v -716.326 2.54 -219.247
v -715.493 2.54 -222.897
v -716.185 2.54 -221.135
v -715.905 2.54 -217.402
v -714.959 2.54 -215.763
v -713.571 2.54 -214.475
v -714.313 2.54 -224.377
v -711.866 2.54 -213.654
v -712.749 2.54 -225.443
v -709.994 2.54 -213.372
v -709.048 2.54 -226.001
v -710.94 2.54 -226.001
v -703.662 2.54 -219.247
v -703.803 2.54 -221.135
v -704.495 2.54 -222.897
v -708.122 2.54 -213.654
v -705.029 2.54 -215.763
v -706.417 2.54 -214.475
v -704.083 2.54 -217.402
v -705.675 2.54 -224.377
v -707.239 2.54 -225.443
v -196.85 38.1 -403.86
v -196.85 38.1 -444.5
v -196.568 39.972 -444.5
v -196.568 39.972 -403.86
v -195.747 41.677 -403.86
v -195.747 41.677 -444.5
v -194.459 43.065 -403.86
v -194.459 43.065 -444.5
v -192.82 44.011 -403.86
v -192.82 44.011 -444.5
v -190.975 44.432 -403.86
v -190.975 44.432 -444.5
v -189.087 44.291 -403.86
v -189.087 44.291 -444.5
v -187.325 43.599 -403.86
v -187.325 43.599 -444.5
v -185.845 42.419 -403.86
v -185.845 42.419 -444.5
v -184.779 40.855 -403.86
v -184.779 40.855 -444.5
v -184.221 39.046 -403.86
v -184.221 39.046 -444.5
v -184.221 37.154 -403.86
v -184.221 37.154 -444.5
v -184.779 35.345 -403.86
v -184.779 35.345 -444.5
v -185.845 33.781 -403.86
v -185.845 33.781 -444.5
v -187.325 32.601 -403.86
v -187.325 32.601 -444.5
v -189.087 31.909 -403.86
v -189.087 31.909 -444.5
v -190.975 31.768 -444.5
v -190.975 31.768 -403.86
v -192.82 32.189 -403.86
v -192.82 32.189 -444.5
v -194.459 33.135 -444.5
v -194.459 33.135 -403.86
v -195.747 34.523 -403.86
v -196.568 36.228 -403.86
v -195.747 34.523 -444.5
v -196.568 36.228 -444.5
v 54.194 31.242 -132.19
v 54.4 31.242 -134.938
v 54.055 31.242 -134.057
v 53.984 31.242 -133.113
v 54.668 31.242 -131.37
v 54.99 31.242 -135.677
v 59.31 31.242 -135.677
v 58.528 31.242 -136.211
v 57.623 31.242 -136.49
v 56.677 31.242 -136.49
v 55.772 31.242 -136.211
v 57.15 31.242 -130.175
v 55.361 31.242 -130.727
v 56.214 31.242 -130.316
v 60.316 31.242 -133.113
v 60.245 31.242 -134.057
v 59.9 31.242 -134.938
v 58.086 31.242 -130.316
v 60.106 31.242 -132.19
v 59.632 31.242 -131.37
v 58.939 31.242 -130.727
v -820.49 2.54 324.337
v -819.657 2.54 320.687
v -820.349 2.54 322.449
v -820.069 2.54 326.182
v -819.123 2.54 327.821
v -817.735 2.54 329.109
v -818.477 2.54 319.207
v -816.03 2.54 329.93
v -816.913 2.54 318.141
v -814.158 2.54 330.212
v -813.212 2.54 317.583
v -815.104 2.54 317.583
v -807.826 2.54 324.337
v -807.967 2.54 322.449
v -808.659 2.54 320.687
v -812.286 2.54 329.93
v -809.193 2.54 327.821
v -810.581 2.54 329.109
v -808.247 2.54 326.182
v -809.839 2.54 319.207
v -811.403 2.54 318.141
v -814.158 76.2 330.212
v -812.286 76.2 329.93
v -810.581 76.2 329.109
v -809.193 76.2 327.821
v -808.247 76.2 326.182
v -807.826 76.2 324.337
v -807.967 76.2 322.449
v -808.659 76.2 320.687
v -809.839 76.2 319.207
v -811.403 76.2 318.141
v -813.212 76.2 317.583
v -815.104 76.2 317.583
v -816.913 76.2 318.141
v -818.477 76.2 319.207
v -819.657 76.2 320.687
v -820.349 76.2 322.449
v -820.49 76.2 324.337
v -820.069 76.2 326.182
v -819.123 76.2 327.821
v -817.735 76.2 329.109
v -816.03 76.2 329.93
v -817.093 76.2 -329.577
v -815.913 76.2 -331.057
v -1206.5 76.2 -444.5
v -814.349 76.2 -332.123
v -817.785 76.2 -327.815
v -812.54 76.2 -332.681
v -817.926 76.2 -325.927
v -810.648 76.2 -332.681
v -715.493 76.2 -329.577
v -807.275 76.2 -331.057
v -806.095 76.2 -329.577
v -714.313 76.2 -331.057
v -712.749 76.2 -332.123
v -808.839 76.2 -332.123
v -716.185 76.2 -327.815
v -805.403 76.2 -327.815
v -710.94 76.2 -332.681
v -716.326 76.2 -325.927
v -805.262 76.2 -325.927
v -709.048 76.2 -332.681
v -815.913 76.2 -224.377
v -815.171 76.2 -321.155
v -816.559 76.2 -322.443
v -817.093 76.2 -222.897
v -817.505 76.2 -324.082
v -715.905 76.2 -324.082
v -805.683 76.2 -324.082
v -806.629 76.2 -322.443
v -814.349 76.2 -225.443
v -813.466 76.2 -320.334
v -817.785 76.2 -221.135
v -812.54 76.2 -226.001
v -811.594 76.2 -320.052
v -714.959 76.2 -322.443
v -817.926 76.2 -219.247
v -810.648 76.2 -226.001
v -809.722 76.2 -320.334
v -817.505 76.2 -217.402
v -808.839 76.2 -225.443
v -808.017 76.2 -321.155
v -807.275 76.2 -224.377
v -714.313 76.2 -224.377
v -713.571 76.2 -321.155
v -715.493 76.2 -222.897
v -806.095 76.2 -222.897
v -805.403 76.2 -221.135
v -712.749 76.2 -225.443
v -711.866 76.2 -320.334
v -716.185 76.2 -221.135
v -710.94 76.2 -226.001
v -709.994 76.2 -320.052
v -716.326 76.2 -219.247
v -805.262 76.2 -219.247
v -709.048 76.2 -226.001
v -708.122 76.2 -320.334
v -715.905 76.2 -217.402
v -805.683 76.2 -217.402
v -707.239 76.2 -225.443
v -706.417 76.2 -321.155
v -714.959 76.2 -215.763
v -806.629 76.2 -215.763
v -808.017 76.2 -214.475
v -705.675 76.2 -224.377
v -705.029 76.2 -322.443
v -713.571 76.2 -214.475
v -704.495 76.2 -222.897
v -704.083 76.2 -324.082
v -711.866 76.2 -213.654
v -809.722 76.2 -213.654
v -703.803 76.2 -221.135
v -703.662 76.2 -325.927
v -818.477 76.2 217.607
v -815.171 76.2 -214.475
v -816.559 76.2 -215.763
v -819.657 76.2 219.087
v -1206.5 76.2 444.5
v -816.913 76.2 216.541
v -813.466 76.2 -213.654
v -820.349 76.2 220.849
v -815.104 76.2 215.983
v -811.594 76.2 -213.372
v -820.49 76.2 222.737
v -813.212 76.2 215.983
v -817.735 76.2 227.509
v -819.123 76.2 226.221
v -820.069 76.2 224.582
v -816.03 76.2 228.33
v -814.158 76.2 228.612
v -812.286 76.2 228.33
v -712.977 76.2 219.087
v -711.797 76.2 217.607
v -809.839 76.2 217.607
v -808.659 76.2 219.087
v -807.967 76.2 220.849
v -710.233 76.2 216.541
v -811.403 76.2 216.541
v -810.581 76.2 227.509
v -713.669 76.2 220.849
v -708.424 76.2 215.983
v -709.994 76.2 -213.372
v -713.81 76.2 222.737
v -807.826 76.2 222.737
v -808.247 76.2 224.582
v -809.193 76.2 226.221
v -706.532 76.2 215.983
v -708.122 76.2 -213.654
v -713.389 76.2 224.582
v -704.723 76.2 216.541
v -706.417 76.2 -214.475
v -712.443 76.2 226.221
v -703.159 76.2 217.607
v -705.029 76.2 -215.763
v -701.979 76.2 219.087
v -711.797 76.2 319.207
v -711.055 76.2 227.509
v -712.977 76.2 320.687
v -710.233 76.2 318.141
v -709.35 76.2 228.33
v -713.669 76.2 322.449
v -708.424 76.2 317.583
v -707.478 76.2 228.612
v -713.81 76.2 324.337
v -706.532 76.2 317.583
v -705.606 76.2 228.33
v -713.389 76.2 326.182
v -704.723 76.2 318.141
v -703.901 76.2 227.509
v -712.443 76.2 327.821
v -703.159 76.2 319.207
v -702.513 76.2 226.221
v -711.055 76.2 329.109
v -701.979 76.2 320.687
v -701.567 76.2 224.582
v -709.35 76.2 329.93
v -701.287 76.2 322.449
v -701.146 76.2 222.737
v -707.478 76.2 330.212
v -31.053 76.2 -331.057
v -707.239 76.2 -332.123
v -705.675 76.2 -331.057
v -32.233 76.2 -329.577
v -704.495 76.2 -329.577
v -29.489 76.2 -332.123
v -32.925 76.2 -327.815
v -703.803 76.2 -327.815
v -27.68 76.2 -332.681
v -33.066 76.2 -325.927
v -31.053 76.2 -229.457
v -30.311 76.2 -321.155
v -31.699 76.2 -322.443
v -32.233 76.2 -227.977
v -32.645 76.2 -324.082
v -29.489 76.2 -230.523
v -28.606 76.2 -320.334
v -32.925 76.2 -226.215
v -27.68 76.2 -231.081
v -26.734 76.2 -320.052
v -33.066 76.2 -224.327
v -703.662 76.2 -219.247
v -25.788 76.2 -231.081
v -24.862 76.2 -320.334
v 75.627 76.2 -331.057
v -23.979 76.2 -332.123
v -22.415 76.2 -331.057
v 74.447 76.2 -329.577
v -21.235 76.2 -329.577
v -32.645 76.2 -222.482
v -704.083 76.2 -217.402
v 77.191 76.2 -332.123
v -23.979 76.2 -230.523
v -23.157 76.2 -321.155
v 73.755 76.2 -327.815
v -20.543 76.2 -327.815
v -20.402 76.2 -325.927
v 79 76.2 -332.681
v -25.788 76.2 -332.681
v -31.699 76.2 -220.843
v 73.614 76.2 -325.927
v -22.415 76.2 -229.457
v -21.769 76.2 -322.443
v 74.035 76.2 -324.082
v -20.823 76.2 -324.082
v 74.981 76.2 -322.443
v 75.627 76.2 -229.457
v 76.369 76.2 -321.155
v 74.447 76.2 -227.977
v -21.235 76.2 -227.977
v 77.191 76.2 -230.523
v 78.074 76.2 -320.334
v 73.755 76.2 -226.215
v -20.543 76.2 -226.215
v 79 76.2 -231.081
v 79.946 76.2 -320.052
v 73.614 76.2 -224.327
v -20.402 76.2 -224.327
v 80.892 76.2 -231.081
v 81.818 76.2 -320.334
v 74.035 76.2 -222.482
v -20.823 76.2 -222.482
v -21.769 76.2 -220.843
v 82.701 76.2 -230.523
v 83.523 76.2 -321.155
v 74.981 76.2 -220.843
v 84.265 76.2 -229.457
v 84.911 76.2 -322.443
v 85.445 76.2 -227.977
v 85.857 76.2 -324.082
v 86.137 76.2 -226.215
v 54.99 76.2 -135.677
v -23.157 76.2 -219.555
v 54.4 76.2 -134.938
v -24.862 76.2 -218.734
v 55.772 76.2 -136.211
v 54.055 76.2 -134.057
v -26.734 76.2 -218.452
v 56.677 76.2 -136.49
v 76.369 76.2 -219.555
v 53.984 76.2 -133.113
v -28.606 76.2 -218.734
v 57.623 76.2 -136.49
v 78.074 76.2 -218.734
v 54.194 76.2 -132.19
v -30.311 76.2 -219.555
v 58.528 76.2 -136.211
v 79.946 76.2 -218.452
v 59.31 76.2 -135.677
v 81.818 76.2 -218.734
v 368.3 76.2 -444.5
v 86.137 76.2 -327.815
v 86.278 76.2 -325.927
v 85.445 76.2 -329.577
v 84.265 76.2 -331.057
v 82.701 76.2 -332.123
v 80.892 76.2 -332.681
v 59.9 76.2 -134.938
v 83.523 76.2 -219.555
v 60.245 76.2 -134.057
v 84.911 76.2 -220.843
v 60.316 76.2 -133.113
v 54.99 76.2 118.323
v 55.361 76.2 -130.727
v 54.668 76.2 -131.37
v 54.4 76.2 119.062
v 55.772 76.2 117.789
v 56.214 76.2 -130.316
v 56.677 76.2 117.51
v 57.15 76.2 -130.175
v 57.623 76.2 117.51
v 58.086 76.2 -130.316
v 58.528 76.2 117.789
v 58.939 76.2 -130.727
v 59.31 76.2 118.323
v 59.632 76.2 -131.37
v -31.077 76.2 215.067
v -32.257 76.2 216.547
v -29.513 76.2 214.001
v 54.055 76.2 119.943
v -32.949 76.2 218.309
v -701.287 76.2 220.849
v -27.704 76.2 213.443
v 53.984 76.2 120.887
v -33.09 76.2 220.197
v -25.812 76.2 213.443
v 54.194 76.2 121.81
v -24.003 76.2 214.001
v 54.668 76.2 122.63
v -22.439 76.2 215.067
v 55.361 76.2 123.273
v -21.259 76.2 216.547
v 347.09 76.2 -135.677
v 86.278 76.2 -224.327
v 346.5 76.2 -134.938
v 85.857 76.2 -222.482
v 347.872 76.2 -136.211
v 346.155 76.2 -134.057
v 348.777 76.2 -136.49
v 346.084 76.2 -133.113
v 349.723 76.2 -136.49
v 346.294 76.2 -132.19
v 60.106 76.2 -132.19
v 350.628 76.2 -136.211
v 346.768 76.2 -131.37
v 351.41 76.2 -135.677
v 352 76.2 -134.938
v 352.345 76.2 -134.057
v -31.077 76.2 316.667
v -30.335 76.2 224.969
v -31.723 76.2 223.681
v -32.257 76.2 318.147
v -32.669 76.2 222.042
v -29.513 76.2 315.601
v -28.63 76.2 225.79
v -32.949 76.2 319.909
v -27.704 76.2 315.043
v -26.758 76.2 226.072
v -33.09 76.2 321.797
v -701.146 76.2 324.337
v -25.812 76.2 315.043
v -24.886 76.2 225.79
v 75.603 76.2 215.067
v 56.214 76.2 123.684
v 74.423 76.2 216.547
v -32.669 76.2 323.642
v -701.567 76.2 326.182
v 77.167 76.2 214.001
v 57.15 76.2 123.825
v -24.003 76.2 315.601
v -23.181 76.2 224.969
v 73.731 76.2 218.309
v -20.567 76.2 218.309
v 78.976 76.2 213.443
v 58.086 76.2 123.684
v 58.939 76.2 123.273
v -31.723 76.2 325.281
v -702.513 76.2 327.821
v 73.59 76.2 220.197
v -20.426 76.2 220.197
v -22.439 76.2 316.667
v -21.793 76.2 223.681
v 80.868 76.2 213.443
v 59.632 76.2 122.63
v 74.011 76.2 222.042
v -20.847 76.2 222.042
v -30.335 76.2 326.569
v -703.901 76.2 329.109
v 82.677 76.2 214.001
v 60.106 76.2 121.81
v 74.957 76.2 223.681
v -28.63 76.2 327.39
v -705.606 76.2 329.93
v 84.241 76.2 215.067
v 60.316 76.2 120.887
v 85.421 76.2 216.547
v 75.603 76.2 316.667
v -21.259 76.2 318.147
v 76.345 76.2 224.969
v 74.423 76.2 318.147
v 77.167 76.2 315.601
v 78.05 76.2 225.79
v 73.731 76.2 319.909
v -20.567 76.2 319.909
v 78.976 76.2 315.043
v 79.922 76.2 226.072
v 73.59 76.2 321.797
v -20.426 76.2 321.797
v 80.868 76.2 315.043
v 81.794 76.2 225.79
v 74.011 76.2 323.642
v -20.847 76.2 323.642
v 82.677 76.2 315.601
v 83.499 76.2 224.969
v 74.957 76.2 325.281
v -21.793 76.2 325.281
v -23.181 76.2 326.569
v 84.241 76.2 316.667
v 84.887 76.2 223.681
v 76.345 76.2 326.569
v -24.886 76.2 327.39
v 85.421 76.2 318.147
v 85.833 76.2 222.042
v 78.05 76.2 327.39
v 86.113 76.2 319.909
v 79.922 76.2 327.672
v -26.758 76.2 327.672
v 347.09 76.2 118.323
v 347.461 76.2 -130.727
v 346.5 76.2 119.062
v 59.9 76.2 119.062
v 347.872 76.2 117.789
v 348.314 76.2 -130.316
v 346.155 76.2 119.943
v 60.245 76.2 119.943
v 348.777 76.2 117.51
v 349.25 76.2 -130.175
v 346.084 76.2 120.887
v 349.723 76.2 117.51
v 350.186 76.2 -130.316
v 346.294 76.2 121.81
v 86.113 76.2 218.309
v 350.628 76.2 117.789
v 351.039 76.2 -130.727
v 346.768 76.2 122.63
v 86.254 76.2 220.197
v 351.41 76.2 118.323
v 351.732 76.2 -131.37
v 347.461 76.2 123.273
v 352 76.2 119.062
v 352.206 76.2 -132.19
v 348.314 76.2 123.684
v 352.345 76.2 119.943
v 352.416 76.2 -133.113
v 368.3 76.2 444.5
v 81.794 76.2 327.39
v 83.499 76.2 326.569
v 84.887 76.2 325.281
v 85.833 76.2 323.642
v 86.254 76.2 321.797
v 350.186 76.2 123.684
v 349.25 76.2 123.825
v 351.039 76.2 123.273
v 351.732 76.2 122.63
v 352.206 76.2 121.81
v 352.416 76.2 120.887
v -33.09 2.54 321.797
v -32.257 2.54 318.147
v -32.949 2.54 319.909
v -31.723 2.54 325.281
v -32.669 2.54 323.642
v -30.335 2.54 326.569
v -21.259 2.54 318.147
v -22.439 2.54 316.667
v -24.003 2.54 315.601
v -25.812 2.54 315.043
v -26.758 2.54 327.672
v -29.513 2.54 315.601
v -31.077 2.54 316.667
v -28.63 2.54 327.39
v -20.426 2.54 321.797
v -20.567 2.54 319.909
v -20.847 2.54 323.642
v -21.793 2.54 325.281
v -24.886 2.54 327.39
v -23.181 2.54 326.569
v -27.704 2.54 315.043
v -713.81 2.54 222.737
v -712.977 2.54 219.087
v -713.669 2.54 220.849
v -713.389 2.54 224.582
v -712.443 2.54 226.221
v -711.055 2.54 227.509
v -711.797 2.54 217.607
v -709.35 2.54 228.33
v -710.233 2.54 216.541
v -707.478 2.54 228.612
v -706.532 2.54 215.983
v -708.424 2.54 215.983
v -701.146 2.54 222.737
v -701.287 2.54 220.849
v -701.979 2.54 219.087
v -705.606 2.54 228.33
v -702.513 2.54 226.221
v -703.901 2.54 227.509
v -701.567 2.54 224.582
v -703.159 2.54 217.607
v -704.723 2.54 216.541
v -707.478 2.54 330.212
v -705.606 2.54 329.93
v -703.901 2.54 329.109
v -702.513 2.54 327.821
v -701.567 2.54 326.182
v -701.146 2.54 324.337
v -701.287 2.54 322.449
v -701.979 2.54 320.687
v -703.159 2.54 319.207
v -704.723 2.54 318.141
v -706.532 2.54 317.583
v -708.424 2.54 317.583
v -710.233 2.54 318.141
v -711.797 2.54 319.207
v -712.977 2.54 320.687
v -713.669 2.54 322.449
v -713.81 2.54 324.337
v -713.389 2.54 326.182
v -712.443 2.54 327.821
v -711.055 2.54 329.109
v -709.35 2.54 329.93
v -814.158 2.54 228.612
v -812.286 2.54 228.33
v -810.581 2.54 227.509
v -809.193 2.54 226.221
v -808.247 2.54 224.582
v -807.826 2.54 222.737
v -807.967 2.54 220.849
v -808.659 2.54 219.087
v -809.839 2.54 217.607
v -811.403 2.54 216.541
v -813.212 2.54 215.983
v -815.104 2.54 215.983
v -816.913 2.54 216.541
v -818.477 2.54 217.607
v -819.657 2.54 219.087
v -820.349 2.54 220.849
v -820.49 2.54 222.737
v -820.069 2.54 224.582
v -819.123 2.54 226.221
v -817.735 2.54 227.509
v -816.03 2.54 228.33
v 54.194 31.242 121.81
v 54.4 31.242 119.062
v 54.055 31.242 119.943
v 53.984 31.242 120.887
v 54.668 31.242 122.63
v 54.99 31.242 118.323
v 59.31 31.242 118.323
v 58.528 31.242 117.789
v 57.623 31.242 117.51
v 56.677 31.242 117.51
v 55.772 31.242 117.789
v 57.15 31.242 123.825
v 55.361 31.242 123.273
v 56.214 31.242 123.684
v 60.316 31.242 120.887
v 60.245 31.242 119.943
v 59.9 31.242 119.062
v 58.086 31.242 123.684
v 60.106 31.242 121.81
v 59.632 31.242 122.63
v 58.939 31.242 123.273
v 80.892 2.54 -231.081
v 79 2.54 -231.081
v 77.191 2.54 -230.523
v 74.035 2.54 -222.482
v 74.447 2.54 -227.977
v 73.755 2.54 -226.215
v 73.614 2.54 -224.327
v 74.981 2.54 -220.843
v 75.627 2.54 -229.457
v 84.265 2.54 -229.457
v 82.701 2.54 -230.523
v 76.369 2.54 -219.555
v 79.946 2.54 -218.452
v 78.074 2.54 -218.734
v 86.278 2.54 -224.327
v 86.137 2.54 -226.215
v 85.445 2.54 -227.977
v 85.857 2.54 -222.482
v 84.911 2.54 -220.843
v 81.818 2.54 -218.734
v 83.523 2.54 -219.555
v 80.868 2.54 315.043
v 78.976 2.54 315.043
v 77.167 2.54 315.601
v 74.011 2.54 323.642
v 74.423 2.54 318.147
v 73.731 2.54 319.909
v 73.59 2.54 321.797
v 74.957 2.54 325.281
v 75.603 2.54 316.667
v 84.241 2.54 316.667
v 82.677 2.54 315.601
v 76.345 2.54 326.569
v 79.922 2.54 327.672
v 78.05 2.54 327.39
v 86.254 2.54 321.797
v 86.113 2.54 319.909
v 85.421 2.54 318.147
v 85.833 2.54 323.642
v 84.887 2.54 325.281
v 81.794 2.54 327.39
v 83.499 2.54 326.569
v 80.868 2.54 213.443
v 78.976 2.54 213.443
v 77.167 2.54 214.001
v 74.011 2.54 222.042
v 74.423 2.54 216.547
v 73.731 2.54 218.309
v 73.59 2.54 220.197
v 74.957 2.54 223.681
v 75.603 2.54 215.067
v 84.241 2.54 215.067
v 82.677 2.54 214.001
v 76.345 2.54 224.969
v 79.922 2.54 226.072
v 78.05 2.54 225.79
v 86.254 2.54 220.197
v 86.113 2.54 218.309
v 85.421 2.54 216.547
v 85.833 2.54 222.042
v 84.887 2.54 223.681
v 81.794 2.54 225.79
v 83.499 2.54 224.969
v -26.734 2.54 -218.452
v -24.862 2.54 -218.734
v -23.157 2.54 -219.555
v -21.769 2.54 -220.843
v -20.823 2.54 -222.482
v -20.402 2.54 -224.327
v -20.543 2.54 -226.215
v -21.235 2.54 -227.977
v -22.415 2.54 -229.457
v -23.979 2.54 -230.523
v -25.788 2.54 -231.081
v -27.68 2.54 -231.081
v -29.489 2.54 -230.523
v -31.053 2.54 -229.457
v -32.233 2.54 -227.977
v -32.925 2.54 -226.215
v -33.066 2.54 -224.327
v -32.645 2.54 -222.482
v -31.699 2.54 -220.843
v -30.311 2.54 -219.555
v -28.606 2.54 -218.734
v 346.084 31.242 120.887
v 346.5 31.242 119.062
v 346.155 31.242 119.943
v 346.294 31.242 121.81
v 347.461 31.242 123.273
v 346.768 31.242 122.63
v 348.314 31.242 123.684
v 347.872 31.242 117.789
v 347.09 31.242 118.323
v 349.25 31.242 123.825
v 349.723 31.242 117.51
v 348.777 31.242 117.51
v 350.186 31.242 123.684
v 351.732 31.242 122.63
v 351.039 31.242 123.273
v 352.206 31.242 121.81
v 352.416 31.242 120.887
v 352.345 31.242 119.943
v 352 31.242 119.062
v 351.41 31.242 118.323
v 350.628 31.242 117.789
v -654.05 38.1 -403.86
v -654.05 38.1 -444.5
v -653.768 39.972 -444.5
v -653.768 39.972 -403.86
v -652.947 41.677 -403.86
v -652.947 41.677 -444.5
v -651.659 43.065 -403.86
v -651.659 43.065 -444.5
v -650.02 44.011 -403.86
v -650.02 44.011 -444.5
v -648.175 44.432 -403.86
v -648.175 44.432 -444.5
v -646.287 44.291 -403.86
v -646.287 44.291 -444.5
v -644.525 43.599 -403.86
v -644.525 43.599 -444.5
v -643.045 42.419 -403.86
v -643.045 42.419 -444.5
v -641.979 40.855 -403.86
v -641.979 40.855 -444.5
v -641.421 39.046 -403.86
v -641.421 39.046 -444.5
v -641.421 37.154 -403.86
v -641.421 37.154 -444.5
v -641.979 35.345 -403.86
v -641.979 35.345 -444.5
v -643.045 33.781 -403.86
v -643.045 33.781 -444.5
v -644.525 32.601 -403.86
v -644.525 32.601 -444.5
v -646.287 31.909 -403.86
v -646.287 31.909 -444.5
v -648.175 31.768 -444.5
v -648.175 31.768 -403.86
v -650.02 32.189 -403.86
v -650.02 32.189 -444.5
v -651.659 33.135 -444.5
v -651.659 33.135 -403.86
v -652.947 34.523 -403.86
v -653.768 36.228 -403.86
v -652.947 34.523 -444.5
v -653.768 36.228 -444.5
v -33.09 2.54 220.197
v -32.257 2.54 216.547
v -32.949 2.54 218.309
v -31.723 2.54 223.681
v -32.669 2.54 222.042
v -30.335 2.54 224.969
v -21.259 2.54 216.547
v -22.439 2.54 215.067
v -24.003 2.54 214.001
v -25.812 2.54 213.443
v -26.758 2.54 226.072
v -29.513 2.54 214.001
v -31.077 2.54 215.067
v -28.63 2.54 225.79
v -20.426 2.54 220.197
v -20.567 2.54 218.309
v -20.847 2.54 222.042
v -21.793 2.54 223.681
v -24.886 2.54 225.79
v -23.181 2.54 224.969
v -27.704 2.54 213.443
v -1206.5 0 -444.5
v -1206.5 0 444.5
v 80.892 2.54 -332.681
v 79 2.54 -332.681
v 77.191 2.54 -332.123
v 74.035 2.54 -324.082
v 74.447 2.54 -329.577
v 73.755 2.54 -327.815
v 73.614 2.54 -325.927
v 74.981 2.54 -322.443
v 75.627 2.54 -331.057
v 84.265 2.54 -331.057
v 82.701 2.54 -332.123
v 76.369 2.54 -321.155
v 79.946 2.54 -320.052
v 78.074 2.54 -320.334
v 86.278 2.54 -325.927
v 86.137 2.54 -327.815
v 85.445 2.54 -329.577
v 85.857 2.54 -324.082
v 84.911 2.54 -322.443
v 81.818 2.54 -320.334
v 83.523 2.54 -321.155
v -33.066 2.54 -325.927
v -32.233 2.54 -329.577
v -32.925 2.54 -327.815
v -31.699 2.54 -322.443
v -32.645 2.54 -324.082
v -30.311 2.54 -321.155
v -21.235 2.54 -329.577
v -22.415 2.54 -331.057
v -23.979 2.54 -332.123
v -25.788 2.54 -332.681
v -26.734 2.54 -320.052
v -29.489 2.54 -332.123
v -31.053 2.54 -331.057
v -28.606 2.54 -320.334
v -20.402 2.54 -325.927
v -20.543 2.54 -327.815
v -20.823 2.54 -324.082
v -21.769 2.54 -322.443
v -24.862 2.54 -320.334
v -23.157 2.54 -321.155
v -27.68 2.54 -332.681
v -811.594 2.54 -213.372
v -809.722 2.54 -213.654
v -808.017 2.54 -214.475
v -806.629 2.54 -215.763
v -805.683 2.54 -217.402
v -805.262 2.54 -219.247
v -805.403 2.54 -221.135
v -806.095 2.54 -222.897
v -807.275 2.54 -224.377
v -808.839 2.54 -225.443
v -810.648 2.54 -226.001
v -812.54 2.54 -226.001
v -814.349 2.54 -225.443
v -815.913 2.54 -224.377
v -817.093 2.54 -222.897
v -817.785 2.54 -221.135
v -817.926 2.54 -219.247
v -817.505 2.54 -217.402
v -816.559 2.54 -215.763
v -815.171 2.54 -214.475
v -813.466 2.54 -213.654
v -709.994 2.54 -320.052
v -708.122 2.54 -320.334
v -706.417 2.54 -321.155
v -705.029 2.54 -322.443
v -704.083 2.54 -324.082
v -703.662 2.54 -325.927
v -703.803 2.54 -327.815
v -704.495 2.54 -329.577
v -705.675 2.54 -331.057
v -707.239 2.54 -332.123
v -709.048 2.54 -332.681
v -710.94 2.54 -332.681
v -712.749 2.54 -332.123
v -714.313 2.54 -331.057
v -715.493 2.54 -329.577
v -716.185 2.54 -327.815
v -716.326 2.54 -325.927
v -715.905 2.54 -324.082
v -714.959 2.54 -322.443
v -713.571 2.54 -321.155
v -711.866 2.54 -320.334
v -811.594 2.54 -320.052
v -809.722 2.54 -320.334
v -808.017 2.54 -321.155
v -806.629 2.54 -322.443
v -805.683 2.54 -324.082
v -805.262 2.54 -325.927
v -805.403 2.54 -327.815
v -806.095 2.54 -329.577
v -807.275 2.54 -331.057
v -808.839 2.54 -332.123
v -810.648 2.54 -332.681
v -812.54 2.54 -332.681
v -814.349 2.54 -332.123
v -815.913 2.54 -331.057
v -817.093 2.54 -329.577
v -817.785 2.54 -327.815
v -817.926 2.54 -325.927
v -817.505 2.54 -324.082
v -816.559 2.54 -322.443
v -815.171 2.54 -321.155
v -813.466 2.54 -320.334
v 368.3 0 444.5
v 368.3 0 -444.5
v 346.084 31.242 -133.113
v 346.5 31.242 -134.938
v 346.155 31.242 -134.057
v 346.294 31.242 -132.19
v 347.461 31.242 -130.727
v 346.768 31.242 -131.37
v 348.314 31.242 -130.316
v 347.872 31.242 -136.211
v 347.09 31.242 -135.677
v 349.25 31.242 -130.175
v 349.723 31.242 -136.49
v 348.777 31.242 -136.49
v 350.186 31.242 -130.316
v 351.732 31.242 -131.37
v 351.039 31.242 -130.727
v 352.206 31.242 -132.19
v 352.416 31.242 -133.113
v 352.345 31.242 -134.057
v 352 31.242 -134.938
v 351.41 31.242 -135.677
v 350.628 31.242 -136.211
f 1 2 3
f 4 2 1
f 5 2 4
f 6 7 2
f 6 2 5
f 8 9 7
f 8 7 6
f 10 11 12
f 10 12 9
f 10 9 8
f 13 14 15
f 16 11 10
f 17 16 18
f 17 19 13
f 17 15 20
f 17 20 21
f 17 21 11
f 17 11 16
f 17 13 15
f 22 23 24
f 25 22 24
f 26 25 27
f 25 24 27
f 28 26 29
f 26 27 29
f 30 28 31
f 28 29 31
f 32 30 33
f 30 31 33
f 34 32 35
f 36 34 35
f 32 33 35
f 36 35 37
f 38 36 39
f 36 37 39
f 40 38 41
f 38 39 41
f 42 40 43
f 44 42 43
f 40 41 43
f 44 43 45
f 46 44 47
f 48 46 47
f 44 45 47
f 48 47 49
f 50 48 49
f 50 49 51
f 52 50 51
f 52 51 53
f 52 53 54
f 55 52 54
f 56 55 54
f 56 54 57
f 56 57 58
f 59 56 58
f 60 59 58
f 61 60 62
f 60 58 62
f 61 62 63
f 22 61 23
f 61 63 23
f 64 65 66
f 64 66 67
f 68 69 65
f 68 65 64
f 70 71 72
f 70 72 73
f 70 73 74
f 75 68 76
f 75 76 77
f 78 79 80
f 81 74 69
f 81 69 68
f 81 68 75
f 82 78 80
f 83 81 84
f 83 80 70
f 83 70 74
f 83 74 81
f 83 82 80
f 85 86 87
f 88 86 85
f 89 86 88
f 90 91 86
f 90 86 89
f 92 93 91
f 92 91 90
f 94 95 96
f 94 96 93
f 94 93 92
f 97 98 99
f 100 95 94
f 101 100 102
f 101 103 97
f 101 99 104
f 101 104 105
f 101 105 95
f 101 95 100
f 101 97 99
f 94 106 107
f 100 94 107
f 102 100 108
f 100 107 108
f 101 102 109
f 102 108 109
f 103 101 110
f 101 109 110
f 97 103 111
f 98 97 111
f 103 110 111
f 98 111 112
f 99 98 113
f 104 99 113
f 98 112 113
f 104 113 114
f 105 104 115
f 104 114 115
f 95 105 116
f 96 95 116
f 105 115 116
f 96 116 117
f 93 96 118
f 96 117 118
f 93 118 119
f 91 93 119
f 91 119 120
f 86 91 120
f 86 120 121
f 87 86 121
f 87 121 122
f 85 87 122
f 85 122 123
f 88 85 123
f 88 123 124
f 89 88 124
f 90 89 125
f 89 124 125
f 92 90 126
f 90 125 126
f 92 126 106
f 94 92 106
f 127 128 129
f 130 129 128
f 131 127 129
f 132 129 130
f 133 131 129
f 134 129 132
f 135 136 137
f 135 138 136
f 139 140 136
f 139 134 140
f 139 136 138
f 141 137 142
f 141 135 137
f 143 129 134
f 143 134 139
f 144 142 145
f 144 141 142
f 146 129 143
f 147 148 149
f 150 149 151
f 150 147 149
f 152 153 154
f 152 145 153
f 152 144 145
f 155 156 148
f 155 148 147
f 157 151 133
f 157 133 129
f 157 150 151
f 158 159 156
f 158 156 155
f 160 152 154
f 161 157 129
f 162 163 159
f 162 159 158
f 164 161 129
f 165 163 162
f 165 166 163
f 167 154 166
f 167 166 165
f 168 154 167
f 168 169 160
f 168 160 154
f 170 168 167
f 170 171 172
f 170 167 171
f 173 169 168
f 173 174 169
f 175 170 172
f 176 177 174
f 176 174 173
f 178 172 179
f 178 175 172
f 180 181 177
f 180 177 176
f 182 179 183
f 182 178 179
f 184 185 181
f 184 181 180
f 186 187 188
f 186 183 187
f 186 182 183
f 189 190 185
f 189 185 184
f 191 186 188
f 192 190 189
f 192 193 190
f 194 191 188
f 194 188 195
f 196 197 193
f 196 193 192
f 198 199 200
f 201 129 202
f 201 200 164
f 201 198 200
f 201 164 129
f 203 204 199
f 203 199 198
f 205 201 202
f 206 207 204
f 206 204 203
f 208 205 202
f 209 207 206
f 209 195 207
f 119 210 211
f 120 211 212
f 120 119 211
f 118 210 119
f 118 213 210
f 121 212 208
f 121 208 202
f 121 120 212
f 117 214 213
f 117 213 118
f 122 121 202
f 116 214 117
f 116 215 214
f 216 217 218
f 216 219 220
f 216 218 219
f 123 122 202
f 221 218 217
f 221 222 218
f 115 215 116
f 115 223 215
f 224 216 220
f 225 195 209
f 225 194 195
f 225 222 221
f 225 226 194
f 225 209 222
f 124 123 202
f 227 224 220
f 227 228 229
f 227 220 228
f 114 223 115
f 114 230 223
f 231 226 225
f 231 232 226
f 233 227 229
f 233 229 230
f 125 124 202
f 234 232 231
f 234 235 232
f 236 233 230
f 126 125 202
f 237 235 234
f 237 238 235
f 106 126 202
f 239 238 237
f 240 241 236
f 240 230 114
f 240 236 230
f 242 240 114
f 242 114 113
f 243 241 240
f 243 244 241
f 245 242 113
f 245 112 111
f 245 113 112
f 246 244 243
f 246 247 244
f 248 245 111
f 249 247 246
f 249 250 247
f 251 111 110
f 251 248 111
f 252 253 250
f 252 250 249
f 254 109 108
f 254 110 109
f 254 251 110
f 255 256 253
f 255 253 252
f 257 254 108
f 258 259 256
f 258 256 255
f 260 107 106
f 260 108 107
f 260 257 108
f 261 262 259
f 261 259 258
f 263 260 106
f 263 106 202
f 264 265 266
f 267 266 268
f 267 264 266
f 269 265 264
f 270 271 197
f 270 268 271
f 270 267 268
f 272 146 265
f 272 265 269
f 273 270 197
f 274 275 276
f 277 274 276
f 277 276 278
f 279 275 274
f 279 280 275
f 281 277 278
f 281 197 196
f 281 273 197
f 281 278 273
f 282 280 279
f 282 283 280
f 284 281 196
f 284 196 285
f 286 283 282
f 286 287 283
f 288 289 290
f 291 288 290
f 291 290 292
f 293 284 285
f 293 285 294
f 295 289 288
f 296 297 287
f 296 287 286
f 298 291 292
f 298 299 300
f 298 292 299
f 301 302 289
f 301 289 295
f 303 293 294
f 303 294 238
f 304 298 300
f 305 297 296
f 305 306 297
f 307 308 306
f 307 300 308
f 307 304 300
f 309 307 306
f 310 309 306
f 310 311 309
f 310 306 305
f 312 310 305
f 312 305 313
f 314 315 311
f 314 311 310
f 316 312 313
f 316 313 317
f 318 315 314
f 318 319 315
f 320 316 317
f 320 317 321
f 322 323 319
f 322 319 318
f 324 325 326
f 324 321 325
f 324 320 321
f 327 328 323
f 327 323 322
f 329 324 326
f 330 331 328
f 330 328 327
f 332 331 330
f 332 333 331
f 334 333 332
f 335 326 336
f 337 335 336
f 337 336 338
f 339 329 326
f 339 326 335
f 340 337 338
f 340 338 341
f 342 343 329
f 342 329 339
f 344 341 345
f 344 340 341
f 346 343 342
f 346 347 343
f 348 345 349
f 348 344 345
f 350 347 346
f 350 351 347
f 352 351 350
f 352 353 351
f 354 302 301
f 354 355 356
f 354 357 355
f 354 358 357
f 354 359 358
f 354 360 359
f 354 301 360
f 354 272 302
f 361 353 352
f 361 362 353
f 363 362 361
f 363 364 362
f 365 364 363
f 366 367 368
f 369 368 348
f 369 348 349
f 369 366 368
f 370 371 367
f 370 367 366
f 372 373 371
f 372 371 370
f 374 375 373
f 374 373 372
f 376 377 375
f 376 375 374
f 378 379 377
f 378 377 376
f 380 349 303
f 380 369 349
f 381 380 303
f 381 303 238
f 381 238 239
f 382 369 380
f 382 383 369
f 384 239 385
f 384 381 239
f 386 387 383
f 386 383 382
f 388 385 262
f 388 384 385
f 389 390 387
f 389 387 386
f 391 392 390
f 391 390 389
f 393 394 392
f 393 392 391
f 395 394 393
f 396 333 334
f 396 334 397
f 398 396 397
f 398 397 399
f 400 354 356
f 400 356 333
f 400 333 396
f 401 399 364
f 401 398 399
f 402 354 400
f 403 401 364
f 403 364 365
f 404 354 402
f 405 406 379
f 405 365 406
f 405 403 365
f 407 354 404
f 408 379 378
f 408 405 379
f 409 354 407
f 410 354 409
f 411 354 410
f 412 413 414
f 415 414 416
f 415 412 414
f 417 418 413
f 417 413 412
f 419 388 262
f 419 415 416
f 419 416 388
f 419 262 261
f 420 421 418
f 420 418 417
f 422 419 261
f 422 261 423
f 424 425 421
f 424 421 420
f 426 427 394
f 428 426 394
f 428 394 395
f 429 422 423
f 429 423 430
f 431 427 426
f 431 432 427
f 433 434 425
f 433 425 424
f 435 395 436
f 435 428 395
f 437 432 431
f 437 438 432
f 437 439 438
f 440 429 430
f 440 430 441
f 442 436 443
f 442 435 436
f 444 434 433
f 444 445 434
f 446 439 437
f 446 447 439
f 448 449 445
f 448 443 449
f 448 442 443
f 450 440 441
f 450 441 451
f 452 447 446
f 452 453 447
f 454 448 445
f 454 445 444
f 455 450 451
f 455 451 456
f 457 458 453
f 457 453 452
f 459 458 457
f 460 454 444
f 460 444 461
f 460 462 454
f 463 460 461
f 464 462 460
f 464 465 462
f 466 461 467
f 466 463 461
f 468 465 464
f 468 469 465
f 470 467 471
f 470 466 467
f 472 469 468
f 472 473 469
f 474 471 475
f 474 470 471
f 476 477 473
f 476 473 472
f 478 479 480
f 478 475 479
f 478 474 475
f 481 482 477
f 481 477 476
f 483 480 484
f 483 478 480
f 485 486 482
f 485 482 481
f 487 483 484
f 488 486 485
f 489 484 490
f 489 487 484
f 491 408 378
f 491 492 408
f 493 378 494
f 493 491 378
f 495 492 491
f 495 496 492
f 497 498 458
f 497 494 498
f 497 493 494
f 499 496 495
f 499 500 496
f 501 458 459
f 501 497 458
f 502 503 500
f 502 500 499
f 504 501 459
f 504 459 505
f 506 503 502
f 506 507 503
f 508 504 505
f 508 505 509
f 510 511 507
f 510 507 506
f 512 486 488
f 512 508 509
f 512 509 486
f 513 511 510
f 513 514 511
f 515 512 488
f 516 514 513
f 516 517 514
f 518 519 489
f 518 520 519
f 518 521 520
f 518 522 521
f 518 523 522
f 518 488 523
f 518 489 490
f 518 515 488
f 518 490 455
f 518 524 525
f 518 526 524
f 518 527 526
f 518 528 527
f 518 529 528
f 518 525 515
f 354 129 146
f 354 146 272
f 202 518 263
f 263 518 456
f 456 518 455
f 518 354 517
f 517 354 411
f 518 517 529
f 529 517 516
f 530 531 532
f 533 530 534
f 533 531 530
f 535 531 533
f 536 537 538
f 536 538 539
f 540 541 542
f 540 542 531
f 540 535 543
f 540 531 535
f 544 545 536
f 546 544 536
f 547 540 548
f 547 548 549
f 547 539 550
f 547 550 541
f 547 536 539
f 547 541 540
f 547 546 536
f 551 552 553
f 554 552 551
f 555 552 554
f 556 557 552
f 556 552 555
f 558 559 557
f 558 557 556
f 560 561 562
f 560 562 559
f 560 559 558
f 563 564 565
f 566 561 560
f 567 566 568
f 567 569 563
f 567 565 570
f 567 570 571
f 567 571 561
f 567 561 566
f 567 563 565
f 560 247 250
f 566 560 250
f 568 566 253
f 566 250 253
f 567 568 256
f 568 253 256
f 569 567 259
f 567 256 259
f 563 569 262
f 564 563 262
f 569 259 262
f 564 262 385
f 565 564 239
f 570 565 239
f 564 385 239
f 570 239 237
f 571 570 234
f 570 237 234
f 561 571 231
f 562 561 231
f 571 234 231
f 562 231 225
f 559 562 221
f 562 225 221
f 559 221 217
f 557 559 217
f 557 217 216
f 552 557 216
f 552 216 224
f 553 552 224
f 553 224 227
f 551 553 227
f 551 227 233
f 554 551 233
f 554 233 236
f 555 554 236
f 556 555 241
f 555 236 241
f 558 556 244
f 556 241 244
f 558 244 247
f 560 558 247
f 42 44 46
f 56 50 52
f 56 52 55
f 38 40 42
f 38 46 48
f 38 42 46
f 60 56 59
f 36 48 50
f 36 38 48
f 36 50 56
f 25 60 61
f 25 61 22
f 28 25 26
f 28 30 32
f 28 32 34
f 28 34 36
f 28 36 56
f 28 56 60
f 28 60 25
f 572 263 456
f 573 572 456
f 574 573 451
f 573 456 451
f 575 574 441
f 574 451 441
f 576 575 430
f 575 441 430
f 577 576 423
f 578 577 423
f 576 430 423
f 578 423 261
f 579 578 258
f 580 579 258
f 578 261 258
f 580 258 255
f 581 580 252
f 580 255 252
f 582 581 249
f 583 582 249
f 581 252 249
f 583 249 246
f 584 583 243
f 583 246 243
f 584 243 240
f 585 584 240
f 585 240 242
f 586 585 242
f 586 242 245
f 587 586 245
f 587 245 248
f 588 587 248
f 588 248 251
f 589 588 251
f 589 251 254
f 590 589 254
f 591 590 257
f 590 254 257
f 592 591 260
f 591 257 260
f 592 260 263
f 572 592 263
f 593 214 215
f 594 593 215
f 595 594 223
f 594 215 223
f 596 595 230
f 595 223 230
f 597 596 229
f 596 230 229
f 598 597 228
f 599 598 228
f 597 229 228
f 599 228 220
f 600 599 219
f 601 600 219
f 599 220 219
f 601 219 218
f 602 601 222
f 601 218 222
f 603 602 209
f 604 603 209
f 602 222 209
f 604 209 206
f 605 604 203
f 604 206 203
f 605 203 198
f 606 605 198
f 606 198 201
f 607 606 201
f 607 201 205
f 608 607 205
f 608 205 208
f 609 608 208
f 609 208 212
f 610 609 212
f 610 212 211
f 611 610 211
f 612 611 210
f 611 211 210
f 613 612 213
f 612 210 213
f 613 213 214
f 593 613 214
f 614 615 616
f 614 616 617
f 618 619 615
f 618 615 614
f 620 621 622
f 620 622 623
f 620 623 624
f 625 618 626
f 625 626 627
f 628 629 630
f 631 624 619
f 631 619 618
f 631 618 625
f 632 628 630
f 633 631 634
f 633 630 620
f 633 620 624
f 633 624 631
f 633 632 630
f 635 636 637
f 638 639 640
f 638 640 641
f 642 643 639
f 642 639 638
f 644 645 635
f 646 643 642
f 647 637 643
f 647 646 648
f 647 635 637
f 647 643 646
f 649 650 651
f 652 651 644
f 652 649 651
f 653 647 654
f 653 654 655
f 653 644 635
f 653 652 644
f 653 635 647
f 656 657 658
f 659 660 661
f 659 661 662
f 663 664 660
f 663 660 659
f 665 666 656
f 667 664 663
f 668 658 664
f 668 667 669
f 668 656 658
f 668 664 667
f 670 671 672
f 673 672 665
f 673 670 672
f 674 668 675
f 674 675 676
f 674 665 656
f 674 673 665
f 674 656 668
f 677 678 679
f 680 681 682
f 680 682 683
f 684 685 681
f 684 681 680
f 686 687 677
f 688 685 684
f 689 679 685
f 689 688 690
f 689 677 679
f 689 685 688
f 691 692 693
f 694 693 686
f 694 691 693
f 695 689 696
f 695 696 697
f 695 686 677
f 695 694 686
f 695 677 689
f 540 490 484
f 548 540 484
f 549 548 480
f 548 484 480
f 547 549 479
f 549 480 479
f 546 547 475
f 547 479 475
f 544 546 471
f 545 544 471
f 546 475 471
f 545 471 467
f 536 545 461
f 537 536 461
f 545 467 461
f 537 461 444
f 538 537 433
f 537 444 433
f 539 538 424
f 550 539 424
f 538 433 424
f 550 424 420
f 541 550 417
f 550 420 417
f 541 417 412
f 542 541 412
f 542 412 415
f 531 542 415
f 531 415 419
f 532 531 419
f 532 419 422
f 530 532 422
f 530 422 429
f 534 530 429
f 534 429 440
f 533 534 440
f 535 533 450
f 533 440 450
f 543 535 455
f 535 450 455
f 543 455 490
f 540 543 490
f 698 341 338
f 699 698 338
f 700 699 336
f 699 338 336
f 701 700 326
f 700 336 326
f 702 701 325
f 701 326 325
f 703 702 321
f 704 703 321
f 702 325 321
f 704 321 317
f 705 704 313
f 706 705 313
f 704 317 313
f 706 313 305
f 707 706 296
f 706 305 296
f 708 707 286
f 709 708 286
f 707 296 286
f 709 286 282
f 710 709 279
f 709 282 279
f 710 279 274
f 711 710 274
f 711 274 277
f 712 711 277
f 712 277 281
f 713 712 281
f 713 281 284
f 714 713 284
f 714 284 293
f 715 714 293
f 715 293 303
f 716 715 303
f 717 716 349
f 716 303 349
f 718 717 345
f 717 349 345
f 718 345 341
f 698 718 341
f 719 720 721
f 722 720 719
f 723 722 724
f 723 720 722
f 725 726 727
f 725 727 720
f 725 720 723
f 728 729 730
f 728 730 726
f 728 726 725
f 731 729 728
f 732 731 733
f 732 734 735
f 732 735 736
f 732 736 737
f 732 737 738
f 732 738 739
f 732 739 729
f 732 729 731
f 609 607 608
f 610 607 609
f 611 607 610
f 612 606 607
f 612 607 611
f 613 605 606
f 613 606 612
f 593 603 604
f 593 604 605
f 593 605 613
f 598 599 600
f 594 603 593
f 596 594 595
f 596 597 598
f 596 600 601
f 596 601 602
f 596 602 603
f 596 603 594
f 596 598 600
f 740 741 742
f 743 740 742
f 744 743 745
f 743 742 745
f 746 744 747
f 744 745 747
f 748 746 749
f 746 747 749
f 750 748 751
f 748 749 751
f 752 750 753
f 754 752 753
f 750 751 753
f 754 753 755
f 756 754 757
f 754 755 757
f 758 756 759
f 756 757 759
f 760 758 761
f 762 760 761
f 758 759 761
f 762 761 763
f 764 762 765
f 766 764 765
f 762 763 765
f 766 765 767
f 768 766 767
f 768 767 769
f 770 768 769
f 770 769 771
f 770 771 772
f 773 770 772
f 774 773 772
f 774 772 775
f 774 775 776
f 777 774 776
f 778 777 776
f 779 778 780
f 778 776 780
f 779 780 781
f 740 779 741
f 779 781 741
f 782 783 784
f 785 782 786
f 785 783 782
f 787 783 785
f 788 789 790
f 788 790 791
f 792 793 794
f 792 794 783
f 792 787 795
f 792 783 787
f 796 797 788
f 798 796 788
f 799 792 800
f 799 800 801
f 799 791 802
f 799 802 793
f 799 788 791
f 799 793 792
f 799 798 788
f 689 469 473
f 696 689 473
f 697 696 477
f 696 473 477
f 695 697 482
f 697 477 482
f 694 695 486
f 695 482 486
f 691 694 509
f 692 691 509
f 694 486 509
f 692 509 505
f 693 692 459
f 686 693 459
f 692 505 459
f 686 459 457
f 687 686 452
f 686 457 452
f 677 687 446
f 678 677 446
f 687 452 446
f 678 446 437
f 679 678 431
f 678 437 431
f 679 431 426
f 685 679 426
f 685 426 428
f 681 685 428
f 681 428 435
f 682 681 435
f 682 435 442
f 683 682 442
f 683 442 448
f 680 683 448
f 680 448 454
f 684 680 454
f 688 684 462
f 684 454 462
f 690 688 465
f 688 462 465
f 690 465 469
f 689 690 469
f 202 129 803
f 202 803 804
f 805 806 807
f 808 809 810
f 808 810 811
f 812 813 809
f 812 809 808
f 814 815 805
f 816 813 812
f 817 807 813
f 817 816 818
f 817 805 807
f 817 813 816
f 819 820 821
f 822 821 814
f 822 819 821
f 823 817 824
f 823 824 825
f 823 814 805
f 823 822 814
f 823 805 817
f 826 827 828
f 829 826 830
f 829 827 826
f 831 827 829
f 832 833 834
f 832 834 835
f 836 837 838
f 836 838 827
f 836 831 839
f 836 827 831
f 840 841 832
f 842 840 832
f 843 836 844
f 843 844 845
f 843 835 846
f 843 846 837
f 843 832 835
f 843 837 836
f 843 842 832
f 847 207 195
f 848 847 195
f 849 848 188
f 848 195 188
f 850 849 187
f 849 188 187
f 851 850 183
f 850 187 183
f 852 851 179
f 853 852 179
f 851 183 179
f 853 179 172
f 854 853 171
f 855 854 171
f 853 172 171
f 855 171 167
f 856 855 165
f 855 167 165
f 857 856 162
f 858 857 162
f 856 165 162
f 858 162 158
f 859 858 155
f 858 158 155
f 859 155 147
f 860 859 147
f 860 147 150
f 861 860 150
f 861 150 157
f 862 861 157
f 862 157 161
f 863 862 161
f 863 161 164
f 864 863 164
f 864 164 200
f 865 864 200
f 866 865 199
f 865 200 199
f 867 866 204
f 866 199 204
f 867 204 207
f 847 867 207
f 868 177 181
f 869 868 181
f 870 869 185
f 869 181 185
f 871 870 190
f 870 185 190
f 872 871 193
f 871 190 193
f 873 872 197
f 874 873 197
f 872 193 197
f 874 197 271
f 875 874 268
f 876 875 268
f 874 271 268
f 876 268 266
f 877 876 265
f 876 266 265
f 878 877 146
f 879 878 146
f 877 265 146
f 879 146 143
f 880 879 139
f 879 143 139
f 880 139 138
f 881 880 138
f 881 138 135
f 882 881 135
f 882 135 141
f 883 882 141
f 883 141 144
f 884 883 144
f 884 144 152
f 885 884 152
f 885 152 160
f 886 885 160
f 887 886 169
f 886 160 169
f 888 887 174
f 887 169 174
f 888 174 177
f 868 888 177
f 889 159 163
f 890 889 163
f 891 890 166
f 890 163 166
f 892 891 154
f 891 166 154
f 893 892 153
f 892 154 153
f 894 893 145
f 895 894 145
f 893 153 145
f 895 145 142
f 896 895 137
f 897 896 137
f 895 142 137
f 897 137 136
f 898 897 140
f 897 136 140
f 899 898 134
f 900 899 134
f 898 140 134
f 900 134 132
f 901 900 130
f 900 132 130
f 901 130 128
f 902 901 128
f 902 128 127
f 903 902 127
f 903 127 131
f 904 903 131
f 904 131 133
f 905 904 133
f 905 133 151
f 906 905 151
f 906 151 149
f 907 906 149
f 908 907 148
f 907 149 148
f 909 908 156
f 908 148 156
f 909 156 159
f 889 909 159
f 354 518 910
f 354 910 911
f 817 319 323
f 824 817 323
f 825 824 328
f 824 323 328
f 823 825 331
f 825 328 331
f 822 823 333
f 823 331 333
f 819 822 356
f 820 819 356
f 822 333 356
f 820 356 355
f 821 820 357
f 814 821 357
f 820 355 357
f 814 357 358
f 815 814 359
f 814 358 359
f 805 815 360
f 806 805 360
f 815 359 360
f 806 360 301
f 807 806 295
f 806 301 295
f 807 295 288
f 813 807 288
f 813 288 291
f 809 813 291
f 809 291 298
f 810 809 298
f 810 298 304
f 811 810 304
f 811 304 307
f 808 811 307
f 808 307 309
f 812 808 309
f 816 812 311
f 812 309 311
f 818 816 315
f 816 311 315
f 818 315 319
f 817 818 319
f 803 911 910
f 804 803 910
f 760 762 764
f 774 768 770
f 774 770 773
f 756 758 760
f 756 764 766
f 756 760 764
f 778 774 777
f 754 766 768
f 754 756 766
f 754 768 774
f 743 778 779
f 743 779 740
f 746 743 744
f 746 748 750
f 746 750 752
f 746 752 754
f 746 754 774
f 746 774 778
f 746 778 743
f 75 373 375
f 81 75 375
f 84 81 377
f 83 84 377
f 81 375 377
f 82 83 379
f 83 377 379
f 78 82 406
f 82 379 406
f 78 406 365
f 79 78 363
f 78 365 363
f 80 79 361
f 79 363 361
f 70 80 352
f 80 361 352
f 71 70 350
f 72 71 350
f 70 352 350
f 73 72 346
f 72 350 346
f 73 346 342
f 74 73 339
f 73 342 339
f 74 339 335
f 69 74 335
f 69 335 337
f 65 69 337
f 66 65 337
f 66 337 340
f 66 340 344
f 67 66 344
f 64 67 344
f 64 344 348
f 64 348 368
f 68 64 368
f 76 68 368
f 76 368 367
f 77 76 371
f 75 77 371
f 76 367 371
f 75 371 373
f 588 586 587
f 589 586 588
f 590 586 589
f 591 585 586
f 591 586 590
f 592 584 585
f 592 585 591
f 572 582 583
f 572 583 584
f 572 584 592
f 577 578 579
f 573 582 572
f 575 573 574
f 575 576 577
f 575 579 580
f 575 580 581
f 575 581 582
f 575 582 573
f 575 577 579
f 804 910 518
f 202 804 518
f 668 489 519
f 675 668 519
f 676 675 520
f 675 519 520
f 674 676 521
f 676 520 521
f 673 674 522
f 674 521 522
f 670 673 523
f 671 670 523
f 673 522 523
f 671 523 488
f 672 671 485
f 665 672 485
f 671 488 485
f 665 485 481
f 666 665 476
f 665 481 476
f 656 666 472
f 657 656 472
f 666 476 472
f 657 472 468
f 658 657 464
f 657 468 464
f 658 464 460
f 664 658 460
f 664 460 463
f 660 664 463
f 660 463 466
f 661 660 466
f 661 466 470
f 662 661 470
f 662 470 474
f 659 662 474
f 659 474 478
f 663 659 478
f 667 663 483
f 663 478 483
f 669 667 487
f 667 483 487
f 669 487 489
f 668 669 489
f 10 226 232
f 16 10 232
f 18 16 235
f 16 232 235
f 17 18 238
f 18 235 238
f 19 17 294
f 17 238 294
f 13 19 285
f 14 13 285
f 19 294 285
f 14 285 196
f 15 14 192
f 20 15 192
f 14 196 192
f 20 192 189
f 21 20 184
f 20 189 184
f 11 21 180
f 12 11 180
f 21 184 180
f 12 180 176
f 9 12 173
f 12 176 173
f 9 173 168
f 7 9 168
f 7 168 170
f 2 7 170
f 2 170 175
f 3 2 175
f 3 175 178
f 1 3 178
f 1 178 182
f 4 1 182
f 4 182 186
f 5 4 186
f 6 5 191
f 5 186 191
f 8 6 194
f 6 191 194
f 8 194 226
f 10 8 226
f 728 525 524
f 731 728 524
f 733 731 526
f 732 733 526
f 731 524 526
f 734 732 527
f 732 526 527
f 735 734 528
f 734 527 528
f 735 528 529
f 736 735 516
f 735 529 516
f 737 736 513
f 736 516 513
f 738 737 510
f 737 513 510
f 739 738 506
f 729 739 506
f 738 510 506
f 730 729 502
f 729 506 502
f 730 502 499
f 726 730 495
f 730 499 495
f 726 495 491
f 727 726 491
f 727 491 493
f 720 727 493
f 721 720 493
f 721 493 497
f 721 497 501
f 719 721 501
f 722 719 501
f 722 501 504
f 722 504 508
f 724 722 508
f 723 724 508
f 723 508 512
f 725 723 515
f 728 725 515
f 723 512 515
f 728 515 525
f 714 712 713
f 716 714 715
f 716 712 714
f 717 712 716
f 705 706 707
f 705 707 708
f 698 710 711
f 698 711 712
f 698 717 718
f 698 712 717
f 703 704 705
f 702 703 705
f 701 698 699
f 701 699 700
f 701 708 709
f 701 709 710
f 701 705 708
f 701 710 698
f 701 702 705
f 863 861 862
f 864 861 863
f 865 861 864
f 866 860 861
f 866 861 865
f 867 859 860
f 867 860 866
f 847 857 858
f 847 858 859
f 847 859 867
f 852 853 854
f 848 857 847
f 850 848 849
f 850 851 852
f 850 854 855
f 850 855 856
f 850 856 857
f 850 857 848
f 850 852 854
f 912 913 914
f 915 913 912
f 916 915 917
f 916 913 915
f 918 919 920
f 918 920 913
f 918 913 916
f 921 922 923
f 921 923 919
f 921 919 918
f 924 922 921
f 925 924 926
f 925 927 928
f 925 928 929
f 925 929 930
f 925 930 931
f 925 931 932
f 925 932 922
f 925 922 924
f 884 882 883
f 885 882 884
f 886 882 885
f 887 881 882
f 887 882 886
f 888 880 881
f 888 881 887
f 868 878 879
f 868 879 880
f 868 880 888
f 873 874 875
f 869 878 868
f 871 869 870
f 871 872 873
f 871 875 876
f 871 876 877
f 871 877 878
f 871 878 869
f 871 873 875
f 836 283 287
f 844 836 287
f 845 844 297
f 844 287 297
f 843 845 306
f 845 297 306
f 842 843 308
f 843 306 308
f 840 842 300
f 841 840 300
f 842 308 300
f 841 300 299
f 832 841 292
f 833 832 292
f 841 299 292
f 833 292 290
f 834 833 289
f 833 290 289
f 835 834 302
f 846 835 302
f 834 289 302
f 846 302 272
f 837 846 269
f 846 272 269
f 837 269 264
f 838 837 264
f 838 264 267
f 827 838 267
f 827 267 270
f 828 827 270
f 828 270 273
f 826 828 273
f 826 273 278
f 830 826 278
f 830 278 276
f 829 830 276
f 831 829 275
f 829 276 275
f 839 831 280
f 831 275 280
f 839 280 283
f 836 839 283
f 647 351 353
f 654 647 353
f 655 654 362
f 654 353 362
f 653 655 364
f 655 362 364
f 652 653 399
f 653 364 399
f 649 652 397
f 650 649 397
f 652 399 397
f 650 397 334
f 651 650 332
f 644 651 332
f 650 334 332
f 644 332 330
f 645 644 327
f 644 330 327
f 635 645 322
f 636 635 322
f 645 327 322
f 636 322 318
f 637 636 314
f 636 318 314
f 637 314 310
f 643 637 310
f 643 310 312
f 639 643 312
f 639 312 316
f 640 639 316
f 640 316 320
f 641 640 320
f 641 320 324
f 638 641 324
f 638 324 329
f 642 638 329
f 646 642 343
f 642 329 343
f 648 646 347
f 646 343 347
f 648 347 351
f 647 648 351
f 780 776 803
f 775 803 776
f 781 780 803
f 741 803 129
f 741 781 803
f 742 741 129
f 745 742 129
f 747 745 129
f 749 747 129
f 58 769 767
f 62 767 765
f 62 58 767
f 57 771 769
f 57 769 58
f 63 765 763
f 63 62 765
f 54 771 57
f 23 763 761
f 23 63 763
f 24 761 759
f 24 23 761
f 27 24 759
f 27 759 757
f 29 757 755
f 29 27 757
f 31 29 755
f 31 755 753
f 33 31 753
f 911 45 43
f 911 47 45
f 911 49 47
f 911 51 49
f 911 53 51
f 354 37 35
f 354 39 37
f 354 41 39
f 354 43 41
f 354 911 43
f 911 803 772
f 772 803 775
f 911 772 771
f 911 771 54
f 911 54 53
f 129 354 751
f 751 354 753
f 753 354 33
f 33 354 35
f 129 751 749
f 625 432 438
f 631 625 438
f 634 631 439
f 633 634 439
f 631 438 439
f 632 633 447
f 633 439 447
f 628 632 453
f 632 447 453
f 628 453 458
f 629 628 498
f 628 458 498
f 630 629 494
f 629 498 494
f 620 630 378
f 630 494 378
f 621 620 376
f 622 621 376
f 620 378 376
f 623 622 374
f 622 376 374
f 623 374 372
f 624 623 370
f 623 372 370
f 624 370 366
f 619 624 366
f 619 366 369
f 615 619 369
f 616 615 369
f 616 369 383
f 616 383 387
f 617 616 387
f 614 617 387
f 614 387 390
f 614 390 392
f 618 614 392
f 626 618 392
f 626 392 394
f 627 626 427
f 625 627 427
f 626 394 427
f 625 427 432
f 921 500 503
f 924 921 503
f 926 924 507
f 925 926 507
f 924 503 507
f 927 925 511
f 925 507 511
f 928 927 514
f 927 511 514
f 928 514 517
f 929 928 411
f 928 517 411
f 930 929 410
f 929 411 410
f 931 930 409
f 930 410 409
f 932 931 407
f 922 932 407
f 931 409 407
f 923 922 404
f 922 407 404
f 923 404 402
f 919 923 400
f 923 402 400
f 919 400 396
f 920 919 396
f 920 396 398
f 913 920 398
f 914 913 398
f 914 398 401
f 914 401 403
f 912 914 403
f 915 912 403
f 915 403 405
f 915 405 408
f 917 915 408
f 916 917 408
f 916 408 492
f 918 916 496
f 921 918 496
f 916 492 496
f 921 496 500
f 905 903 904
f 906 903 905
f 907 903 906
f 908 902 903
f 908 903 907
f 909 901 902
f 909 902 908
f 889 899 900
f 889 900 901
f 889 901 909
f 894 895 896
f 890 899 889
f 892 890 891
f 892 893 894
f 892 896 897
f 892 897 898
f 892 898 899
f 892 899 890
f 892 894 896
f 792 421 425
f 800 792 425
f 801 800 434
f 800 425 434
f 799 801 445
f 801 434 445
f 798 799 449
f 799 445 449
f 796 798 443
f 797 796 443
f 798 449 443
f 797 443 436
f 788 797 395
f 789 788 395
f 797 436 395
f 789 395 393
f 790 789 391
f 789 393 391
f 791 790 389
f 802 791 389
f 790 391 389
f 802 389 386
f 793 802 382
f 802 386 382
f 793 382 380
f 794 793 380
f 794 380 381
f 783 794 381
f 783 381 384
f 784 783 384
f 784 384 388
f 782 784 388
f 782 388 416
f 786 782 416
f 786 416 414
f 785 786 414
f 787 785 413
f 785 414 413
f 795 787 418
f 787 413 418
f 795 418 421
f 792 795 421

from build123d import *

# Parameters (mm, degrees)
SKETCH1_W           = 1752.6
SKETCH1_H           = 889
BOSS_EXTRUDE1_DEPTH = 76.2
SKETCH2_W           = 889
SKETCH2_H           = 76.2
BOSS_EXTRUDE2_DEPTH = 330.2
SKETCH4_W           = 889
SKETCH4_H           = 76.2
CUT_EXTRUDE1_DEPTH  = 508
SKETCH5_R           = 6.35
CUT_EXTRUDE2_DEPTH  = 73.66
SKETCH7_R           = 6.35
CUT_EXTRUDE4_DEPTH  = 40.64
SKETCH8_R           = 3.175
CUT_EXTRUDE5_DEPTH  = 44.958


with BuildPart() as part:
    # Sketch1 → Boss-Extrude1 (new body)
    with BuildSketch(Plane(origin=(0, 0, 0), x_dir=(1, 0, 0), z_dir=(0, 1, 0))):
        Rectangle(SKETCH1_W, SKETCH1_H)
    extrude(amount=BOSS_EXTRUDE1_DEPTH)

    # Sketch2 → Boss-Extrude2 (add)
    with BuildSketch(Plane.ZY.offset(876.3)):
        with Locations((0, 38.1)):
            Rectangle(SKETCH2_W, SKETCH2_H)
    extrude(amount=BOSS_EXTRUDE2_DEPTH)

    # Sketch4 → Cut-Extrude1 (cut)
    with BuildSketch(Plane(origin=(876.3, 0, 0), x_dir=(0, 0, -1), z_dir=(1, 0, 0))):
        with Locations((0, 38.1)):
            Rectangle(SKETCH4_W, SKETCH4_H)
    extrude(amount=-CUT_EXTRUDE1_DEPTH, mode=Mode.SUBTRACT)

    # Sketch5 → Cut-Extrude2 (cut)
    with BuildSketch(Plane(origin=(0, 76.2, 0), x_dir=(1, 0, 0), z_dir=(0, 1, 0))):
        with Locations(Location((-811.594063252, 219.722, 0), (0, 0, 270))):
            Circle(SKETCH5_R)
        with Locations(Location((-811.594063252, 326.402, 0), (0, 0, 270))):
            Circle(SKETCH5_R)
        with Locations(Location((-709.994063252, 326.402, 0), (0, 0, 270))):
            Circle(SKETCH5_R)
        with Locations(Location((-709.994063252, 219.722, 0), (0, 0, 270))):
            Circle(SKETCH5_R)
        with Locations(Location((-26.734063252, 326.402, 0), (0, 0, 270))):
            Circle(SKETCH5_R)
        with Locations(Location((79.945936748, 326.402, 0), (0, 0, 270))):
            Circle(SKETCH5_R)
        with Locations(Location((79.945936748, 224.802, 0), (0, 0, 270))):
            Circle(SKETCH5_R)
        with Locations(Location((-26.734063252, 224.802, 0), (0, 0, 270))):
            Circle(SKETCH5_R)
        with Locations(Location((-26.758063252, -219.722, 0), (0, 0, 270))):
            Circle(SKETCH5_R)
        with Locations(Location((79.921936748, -219.722, 0), (0, 0, 270))):
            Circle(SKETCH5_R)
        with Locations(Location((79.921936748, -321.322, 0), (0, 0, 270))):
            Circle(SKETCH5_R)
        with Locations(Location((-26.758063252, -321.322, 0), (0, 0, 270))):
            Circle(SKETCH5_R)
        with Locations(Location((-707.478063252, -222.262, 0), (0, 0, 270))):
            Circle(SKETCH5_R)
        with Locations(Location((-707.478063252, -323.862, 0), (0, 0, 270))):
            Circle(SKETCH5_R)
        with Locations(Location((-814.158063252, -323.862, 0), (0, 0, 270))):
            Circle(SKETCH5_R)
        with Locations(Location((-814.158063252, -222.262, 0), (0, 0, 270))):
            Circle(SKETCH5_R)
    extrude(amount=-CUT_EXTRUDE2_DEPTH, mode=Mode.SUBTRACT)

    # Sketch7 → Cut-Extrude4 (cut)
    with BuildSketch(Plane(origin=(0, 0, -444.5), x_dir=(-1, 0, 0), z_dir=(0, 0, -1))):
        with Locations((190.5, 38.1)):
            Circle(SKETCH7_R)
        with Locations((647.7, 38.1)):
            Circle(SKETCH7_R)
    extrude(amount=-CUT_EXTRUDE4_DEPTH, mode=Mode.SUBTRACT)

    # Sketch8 → Cut-Extrude5 (cut)
    with BuildSketch(Plane(origin=(0, 76.2, 0), x_dir=(1, 0, 0), z_dir=(0, 1, 0))):
        with Locations(Location((349.25, 133.35, 0), (0, 0, 270))):
            Circle(SKETCH8_R)
        with Locations(Location((349.25, -120.65, 0), (0, 0, 270))):
            Circle(SKETCH8_R)
        with Locations(Location((57.15, -120.65, 0), (0, 0, 270))):
            Circle(SKETCH8_R)
        with Locations(Location((57.15, 133.35, 0), (0, 0, 270))):
            Circle(SKETCH8_R)
    extrude(amount=-CUT_EXTRUDE5_DEPTH, mode=Mode.SUBTRACT)


solid = part.part
